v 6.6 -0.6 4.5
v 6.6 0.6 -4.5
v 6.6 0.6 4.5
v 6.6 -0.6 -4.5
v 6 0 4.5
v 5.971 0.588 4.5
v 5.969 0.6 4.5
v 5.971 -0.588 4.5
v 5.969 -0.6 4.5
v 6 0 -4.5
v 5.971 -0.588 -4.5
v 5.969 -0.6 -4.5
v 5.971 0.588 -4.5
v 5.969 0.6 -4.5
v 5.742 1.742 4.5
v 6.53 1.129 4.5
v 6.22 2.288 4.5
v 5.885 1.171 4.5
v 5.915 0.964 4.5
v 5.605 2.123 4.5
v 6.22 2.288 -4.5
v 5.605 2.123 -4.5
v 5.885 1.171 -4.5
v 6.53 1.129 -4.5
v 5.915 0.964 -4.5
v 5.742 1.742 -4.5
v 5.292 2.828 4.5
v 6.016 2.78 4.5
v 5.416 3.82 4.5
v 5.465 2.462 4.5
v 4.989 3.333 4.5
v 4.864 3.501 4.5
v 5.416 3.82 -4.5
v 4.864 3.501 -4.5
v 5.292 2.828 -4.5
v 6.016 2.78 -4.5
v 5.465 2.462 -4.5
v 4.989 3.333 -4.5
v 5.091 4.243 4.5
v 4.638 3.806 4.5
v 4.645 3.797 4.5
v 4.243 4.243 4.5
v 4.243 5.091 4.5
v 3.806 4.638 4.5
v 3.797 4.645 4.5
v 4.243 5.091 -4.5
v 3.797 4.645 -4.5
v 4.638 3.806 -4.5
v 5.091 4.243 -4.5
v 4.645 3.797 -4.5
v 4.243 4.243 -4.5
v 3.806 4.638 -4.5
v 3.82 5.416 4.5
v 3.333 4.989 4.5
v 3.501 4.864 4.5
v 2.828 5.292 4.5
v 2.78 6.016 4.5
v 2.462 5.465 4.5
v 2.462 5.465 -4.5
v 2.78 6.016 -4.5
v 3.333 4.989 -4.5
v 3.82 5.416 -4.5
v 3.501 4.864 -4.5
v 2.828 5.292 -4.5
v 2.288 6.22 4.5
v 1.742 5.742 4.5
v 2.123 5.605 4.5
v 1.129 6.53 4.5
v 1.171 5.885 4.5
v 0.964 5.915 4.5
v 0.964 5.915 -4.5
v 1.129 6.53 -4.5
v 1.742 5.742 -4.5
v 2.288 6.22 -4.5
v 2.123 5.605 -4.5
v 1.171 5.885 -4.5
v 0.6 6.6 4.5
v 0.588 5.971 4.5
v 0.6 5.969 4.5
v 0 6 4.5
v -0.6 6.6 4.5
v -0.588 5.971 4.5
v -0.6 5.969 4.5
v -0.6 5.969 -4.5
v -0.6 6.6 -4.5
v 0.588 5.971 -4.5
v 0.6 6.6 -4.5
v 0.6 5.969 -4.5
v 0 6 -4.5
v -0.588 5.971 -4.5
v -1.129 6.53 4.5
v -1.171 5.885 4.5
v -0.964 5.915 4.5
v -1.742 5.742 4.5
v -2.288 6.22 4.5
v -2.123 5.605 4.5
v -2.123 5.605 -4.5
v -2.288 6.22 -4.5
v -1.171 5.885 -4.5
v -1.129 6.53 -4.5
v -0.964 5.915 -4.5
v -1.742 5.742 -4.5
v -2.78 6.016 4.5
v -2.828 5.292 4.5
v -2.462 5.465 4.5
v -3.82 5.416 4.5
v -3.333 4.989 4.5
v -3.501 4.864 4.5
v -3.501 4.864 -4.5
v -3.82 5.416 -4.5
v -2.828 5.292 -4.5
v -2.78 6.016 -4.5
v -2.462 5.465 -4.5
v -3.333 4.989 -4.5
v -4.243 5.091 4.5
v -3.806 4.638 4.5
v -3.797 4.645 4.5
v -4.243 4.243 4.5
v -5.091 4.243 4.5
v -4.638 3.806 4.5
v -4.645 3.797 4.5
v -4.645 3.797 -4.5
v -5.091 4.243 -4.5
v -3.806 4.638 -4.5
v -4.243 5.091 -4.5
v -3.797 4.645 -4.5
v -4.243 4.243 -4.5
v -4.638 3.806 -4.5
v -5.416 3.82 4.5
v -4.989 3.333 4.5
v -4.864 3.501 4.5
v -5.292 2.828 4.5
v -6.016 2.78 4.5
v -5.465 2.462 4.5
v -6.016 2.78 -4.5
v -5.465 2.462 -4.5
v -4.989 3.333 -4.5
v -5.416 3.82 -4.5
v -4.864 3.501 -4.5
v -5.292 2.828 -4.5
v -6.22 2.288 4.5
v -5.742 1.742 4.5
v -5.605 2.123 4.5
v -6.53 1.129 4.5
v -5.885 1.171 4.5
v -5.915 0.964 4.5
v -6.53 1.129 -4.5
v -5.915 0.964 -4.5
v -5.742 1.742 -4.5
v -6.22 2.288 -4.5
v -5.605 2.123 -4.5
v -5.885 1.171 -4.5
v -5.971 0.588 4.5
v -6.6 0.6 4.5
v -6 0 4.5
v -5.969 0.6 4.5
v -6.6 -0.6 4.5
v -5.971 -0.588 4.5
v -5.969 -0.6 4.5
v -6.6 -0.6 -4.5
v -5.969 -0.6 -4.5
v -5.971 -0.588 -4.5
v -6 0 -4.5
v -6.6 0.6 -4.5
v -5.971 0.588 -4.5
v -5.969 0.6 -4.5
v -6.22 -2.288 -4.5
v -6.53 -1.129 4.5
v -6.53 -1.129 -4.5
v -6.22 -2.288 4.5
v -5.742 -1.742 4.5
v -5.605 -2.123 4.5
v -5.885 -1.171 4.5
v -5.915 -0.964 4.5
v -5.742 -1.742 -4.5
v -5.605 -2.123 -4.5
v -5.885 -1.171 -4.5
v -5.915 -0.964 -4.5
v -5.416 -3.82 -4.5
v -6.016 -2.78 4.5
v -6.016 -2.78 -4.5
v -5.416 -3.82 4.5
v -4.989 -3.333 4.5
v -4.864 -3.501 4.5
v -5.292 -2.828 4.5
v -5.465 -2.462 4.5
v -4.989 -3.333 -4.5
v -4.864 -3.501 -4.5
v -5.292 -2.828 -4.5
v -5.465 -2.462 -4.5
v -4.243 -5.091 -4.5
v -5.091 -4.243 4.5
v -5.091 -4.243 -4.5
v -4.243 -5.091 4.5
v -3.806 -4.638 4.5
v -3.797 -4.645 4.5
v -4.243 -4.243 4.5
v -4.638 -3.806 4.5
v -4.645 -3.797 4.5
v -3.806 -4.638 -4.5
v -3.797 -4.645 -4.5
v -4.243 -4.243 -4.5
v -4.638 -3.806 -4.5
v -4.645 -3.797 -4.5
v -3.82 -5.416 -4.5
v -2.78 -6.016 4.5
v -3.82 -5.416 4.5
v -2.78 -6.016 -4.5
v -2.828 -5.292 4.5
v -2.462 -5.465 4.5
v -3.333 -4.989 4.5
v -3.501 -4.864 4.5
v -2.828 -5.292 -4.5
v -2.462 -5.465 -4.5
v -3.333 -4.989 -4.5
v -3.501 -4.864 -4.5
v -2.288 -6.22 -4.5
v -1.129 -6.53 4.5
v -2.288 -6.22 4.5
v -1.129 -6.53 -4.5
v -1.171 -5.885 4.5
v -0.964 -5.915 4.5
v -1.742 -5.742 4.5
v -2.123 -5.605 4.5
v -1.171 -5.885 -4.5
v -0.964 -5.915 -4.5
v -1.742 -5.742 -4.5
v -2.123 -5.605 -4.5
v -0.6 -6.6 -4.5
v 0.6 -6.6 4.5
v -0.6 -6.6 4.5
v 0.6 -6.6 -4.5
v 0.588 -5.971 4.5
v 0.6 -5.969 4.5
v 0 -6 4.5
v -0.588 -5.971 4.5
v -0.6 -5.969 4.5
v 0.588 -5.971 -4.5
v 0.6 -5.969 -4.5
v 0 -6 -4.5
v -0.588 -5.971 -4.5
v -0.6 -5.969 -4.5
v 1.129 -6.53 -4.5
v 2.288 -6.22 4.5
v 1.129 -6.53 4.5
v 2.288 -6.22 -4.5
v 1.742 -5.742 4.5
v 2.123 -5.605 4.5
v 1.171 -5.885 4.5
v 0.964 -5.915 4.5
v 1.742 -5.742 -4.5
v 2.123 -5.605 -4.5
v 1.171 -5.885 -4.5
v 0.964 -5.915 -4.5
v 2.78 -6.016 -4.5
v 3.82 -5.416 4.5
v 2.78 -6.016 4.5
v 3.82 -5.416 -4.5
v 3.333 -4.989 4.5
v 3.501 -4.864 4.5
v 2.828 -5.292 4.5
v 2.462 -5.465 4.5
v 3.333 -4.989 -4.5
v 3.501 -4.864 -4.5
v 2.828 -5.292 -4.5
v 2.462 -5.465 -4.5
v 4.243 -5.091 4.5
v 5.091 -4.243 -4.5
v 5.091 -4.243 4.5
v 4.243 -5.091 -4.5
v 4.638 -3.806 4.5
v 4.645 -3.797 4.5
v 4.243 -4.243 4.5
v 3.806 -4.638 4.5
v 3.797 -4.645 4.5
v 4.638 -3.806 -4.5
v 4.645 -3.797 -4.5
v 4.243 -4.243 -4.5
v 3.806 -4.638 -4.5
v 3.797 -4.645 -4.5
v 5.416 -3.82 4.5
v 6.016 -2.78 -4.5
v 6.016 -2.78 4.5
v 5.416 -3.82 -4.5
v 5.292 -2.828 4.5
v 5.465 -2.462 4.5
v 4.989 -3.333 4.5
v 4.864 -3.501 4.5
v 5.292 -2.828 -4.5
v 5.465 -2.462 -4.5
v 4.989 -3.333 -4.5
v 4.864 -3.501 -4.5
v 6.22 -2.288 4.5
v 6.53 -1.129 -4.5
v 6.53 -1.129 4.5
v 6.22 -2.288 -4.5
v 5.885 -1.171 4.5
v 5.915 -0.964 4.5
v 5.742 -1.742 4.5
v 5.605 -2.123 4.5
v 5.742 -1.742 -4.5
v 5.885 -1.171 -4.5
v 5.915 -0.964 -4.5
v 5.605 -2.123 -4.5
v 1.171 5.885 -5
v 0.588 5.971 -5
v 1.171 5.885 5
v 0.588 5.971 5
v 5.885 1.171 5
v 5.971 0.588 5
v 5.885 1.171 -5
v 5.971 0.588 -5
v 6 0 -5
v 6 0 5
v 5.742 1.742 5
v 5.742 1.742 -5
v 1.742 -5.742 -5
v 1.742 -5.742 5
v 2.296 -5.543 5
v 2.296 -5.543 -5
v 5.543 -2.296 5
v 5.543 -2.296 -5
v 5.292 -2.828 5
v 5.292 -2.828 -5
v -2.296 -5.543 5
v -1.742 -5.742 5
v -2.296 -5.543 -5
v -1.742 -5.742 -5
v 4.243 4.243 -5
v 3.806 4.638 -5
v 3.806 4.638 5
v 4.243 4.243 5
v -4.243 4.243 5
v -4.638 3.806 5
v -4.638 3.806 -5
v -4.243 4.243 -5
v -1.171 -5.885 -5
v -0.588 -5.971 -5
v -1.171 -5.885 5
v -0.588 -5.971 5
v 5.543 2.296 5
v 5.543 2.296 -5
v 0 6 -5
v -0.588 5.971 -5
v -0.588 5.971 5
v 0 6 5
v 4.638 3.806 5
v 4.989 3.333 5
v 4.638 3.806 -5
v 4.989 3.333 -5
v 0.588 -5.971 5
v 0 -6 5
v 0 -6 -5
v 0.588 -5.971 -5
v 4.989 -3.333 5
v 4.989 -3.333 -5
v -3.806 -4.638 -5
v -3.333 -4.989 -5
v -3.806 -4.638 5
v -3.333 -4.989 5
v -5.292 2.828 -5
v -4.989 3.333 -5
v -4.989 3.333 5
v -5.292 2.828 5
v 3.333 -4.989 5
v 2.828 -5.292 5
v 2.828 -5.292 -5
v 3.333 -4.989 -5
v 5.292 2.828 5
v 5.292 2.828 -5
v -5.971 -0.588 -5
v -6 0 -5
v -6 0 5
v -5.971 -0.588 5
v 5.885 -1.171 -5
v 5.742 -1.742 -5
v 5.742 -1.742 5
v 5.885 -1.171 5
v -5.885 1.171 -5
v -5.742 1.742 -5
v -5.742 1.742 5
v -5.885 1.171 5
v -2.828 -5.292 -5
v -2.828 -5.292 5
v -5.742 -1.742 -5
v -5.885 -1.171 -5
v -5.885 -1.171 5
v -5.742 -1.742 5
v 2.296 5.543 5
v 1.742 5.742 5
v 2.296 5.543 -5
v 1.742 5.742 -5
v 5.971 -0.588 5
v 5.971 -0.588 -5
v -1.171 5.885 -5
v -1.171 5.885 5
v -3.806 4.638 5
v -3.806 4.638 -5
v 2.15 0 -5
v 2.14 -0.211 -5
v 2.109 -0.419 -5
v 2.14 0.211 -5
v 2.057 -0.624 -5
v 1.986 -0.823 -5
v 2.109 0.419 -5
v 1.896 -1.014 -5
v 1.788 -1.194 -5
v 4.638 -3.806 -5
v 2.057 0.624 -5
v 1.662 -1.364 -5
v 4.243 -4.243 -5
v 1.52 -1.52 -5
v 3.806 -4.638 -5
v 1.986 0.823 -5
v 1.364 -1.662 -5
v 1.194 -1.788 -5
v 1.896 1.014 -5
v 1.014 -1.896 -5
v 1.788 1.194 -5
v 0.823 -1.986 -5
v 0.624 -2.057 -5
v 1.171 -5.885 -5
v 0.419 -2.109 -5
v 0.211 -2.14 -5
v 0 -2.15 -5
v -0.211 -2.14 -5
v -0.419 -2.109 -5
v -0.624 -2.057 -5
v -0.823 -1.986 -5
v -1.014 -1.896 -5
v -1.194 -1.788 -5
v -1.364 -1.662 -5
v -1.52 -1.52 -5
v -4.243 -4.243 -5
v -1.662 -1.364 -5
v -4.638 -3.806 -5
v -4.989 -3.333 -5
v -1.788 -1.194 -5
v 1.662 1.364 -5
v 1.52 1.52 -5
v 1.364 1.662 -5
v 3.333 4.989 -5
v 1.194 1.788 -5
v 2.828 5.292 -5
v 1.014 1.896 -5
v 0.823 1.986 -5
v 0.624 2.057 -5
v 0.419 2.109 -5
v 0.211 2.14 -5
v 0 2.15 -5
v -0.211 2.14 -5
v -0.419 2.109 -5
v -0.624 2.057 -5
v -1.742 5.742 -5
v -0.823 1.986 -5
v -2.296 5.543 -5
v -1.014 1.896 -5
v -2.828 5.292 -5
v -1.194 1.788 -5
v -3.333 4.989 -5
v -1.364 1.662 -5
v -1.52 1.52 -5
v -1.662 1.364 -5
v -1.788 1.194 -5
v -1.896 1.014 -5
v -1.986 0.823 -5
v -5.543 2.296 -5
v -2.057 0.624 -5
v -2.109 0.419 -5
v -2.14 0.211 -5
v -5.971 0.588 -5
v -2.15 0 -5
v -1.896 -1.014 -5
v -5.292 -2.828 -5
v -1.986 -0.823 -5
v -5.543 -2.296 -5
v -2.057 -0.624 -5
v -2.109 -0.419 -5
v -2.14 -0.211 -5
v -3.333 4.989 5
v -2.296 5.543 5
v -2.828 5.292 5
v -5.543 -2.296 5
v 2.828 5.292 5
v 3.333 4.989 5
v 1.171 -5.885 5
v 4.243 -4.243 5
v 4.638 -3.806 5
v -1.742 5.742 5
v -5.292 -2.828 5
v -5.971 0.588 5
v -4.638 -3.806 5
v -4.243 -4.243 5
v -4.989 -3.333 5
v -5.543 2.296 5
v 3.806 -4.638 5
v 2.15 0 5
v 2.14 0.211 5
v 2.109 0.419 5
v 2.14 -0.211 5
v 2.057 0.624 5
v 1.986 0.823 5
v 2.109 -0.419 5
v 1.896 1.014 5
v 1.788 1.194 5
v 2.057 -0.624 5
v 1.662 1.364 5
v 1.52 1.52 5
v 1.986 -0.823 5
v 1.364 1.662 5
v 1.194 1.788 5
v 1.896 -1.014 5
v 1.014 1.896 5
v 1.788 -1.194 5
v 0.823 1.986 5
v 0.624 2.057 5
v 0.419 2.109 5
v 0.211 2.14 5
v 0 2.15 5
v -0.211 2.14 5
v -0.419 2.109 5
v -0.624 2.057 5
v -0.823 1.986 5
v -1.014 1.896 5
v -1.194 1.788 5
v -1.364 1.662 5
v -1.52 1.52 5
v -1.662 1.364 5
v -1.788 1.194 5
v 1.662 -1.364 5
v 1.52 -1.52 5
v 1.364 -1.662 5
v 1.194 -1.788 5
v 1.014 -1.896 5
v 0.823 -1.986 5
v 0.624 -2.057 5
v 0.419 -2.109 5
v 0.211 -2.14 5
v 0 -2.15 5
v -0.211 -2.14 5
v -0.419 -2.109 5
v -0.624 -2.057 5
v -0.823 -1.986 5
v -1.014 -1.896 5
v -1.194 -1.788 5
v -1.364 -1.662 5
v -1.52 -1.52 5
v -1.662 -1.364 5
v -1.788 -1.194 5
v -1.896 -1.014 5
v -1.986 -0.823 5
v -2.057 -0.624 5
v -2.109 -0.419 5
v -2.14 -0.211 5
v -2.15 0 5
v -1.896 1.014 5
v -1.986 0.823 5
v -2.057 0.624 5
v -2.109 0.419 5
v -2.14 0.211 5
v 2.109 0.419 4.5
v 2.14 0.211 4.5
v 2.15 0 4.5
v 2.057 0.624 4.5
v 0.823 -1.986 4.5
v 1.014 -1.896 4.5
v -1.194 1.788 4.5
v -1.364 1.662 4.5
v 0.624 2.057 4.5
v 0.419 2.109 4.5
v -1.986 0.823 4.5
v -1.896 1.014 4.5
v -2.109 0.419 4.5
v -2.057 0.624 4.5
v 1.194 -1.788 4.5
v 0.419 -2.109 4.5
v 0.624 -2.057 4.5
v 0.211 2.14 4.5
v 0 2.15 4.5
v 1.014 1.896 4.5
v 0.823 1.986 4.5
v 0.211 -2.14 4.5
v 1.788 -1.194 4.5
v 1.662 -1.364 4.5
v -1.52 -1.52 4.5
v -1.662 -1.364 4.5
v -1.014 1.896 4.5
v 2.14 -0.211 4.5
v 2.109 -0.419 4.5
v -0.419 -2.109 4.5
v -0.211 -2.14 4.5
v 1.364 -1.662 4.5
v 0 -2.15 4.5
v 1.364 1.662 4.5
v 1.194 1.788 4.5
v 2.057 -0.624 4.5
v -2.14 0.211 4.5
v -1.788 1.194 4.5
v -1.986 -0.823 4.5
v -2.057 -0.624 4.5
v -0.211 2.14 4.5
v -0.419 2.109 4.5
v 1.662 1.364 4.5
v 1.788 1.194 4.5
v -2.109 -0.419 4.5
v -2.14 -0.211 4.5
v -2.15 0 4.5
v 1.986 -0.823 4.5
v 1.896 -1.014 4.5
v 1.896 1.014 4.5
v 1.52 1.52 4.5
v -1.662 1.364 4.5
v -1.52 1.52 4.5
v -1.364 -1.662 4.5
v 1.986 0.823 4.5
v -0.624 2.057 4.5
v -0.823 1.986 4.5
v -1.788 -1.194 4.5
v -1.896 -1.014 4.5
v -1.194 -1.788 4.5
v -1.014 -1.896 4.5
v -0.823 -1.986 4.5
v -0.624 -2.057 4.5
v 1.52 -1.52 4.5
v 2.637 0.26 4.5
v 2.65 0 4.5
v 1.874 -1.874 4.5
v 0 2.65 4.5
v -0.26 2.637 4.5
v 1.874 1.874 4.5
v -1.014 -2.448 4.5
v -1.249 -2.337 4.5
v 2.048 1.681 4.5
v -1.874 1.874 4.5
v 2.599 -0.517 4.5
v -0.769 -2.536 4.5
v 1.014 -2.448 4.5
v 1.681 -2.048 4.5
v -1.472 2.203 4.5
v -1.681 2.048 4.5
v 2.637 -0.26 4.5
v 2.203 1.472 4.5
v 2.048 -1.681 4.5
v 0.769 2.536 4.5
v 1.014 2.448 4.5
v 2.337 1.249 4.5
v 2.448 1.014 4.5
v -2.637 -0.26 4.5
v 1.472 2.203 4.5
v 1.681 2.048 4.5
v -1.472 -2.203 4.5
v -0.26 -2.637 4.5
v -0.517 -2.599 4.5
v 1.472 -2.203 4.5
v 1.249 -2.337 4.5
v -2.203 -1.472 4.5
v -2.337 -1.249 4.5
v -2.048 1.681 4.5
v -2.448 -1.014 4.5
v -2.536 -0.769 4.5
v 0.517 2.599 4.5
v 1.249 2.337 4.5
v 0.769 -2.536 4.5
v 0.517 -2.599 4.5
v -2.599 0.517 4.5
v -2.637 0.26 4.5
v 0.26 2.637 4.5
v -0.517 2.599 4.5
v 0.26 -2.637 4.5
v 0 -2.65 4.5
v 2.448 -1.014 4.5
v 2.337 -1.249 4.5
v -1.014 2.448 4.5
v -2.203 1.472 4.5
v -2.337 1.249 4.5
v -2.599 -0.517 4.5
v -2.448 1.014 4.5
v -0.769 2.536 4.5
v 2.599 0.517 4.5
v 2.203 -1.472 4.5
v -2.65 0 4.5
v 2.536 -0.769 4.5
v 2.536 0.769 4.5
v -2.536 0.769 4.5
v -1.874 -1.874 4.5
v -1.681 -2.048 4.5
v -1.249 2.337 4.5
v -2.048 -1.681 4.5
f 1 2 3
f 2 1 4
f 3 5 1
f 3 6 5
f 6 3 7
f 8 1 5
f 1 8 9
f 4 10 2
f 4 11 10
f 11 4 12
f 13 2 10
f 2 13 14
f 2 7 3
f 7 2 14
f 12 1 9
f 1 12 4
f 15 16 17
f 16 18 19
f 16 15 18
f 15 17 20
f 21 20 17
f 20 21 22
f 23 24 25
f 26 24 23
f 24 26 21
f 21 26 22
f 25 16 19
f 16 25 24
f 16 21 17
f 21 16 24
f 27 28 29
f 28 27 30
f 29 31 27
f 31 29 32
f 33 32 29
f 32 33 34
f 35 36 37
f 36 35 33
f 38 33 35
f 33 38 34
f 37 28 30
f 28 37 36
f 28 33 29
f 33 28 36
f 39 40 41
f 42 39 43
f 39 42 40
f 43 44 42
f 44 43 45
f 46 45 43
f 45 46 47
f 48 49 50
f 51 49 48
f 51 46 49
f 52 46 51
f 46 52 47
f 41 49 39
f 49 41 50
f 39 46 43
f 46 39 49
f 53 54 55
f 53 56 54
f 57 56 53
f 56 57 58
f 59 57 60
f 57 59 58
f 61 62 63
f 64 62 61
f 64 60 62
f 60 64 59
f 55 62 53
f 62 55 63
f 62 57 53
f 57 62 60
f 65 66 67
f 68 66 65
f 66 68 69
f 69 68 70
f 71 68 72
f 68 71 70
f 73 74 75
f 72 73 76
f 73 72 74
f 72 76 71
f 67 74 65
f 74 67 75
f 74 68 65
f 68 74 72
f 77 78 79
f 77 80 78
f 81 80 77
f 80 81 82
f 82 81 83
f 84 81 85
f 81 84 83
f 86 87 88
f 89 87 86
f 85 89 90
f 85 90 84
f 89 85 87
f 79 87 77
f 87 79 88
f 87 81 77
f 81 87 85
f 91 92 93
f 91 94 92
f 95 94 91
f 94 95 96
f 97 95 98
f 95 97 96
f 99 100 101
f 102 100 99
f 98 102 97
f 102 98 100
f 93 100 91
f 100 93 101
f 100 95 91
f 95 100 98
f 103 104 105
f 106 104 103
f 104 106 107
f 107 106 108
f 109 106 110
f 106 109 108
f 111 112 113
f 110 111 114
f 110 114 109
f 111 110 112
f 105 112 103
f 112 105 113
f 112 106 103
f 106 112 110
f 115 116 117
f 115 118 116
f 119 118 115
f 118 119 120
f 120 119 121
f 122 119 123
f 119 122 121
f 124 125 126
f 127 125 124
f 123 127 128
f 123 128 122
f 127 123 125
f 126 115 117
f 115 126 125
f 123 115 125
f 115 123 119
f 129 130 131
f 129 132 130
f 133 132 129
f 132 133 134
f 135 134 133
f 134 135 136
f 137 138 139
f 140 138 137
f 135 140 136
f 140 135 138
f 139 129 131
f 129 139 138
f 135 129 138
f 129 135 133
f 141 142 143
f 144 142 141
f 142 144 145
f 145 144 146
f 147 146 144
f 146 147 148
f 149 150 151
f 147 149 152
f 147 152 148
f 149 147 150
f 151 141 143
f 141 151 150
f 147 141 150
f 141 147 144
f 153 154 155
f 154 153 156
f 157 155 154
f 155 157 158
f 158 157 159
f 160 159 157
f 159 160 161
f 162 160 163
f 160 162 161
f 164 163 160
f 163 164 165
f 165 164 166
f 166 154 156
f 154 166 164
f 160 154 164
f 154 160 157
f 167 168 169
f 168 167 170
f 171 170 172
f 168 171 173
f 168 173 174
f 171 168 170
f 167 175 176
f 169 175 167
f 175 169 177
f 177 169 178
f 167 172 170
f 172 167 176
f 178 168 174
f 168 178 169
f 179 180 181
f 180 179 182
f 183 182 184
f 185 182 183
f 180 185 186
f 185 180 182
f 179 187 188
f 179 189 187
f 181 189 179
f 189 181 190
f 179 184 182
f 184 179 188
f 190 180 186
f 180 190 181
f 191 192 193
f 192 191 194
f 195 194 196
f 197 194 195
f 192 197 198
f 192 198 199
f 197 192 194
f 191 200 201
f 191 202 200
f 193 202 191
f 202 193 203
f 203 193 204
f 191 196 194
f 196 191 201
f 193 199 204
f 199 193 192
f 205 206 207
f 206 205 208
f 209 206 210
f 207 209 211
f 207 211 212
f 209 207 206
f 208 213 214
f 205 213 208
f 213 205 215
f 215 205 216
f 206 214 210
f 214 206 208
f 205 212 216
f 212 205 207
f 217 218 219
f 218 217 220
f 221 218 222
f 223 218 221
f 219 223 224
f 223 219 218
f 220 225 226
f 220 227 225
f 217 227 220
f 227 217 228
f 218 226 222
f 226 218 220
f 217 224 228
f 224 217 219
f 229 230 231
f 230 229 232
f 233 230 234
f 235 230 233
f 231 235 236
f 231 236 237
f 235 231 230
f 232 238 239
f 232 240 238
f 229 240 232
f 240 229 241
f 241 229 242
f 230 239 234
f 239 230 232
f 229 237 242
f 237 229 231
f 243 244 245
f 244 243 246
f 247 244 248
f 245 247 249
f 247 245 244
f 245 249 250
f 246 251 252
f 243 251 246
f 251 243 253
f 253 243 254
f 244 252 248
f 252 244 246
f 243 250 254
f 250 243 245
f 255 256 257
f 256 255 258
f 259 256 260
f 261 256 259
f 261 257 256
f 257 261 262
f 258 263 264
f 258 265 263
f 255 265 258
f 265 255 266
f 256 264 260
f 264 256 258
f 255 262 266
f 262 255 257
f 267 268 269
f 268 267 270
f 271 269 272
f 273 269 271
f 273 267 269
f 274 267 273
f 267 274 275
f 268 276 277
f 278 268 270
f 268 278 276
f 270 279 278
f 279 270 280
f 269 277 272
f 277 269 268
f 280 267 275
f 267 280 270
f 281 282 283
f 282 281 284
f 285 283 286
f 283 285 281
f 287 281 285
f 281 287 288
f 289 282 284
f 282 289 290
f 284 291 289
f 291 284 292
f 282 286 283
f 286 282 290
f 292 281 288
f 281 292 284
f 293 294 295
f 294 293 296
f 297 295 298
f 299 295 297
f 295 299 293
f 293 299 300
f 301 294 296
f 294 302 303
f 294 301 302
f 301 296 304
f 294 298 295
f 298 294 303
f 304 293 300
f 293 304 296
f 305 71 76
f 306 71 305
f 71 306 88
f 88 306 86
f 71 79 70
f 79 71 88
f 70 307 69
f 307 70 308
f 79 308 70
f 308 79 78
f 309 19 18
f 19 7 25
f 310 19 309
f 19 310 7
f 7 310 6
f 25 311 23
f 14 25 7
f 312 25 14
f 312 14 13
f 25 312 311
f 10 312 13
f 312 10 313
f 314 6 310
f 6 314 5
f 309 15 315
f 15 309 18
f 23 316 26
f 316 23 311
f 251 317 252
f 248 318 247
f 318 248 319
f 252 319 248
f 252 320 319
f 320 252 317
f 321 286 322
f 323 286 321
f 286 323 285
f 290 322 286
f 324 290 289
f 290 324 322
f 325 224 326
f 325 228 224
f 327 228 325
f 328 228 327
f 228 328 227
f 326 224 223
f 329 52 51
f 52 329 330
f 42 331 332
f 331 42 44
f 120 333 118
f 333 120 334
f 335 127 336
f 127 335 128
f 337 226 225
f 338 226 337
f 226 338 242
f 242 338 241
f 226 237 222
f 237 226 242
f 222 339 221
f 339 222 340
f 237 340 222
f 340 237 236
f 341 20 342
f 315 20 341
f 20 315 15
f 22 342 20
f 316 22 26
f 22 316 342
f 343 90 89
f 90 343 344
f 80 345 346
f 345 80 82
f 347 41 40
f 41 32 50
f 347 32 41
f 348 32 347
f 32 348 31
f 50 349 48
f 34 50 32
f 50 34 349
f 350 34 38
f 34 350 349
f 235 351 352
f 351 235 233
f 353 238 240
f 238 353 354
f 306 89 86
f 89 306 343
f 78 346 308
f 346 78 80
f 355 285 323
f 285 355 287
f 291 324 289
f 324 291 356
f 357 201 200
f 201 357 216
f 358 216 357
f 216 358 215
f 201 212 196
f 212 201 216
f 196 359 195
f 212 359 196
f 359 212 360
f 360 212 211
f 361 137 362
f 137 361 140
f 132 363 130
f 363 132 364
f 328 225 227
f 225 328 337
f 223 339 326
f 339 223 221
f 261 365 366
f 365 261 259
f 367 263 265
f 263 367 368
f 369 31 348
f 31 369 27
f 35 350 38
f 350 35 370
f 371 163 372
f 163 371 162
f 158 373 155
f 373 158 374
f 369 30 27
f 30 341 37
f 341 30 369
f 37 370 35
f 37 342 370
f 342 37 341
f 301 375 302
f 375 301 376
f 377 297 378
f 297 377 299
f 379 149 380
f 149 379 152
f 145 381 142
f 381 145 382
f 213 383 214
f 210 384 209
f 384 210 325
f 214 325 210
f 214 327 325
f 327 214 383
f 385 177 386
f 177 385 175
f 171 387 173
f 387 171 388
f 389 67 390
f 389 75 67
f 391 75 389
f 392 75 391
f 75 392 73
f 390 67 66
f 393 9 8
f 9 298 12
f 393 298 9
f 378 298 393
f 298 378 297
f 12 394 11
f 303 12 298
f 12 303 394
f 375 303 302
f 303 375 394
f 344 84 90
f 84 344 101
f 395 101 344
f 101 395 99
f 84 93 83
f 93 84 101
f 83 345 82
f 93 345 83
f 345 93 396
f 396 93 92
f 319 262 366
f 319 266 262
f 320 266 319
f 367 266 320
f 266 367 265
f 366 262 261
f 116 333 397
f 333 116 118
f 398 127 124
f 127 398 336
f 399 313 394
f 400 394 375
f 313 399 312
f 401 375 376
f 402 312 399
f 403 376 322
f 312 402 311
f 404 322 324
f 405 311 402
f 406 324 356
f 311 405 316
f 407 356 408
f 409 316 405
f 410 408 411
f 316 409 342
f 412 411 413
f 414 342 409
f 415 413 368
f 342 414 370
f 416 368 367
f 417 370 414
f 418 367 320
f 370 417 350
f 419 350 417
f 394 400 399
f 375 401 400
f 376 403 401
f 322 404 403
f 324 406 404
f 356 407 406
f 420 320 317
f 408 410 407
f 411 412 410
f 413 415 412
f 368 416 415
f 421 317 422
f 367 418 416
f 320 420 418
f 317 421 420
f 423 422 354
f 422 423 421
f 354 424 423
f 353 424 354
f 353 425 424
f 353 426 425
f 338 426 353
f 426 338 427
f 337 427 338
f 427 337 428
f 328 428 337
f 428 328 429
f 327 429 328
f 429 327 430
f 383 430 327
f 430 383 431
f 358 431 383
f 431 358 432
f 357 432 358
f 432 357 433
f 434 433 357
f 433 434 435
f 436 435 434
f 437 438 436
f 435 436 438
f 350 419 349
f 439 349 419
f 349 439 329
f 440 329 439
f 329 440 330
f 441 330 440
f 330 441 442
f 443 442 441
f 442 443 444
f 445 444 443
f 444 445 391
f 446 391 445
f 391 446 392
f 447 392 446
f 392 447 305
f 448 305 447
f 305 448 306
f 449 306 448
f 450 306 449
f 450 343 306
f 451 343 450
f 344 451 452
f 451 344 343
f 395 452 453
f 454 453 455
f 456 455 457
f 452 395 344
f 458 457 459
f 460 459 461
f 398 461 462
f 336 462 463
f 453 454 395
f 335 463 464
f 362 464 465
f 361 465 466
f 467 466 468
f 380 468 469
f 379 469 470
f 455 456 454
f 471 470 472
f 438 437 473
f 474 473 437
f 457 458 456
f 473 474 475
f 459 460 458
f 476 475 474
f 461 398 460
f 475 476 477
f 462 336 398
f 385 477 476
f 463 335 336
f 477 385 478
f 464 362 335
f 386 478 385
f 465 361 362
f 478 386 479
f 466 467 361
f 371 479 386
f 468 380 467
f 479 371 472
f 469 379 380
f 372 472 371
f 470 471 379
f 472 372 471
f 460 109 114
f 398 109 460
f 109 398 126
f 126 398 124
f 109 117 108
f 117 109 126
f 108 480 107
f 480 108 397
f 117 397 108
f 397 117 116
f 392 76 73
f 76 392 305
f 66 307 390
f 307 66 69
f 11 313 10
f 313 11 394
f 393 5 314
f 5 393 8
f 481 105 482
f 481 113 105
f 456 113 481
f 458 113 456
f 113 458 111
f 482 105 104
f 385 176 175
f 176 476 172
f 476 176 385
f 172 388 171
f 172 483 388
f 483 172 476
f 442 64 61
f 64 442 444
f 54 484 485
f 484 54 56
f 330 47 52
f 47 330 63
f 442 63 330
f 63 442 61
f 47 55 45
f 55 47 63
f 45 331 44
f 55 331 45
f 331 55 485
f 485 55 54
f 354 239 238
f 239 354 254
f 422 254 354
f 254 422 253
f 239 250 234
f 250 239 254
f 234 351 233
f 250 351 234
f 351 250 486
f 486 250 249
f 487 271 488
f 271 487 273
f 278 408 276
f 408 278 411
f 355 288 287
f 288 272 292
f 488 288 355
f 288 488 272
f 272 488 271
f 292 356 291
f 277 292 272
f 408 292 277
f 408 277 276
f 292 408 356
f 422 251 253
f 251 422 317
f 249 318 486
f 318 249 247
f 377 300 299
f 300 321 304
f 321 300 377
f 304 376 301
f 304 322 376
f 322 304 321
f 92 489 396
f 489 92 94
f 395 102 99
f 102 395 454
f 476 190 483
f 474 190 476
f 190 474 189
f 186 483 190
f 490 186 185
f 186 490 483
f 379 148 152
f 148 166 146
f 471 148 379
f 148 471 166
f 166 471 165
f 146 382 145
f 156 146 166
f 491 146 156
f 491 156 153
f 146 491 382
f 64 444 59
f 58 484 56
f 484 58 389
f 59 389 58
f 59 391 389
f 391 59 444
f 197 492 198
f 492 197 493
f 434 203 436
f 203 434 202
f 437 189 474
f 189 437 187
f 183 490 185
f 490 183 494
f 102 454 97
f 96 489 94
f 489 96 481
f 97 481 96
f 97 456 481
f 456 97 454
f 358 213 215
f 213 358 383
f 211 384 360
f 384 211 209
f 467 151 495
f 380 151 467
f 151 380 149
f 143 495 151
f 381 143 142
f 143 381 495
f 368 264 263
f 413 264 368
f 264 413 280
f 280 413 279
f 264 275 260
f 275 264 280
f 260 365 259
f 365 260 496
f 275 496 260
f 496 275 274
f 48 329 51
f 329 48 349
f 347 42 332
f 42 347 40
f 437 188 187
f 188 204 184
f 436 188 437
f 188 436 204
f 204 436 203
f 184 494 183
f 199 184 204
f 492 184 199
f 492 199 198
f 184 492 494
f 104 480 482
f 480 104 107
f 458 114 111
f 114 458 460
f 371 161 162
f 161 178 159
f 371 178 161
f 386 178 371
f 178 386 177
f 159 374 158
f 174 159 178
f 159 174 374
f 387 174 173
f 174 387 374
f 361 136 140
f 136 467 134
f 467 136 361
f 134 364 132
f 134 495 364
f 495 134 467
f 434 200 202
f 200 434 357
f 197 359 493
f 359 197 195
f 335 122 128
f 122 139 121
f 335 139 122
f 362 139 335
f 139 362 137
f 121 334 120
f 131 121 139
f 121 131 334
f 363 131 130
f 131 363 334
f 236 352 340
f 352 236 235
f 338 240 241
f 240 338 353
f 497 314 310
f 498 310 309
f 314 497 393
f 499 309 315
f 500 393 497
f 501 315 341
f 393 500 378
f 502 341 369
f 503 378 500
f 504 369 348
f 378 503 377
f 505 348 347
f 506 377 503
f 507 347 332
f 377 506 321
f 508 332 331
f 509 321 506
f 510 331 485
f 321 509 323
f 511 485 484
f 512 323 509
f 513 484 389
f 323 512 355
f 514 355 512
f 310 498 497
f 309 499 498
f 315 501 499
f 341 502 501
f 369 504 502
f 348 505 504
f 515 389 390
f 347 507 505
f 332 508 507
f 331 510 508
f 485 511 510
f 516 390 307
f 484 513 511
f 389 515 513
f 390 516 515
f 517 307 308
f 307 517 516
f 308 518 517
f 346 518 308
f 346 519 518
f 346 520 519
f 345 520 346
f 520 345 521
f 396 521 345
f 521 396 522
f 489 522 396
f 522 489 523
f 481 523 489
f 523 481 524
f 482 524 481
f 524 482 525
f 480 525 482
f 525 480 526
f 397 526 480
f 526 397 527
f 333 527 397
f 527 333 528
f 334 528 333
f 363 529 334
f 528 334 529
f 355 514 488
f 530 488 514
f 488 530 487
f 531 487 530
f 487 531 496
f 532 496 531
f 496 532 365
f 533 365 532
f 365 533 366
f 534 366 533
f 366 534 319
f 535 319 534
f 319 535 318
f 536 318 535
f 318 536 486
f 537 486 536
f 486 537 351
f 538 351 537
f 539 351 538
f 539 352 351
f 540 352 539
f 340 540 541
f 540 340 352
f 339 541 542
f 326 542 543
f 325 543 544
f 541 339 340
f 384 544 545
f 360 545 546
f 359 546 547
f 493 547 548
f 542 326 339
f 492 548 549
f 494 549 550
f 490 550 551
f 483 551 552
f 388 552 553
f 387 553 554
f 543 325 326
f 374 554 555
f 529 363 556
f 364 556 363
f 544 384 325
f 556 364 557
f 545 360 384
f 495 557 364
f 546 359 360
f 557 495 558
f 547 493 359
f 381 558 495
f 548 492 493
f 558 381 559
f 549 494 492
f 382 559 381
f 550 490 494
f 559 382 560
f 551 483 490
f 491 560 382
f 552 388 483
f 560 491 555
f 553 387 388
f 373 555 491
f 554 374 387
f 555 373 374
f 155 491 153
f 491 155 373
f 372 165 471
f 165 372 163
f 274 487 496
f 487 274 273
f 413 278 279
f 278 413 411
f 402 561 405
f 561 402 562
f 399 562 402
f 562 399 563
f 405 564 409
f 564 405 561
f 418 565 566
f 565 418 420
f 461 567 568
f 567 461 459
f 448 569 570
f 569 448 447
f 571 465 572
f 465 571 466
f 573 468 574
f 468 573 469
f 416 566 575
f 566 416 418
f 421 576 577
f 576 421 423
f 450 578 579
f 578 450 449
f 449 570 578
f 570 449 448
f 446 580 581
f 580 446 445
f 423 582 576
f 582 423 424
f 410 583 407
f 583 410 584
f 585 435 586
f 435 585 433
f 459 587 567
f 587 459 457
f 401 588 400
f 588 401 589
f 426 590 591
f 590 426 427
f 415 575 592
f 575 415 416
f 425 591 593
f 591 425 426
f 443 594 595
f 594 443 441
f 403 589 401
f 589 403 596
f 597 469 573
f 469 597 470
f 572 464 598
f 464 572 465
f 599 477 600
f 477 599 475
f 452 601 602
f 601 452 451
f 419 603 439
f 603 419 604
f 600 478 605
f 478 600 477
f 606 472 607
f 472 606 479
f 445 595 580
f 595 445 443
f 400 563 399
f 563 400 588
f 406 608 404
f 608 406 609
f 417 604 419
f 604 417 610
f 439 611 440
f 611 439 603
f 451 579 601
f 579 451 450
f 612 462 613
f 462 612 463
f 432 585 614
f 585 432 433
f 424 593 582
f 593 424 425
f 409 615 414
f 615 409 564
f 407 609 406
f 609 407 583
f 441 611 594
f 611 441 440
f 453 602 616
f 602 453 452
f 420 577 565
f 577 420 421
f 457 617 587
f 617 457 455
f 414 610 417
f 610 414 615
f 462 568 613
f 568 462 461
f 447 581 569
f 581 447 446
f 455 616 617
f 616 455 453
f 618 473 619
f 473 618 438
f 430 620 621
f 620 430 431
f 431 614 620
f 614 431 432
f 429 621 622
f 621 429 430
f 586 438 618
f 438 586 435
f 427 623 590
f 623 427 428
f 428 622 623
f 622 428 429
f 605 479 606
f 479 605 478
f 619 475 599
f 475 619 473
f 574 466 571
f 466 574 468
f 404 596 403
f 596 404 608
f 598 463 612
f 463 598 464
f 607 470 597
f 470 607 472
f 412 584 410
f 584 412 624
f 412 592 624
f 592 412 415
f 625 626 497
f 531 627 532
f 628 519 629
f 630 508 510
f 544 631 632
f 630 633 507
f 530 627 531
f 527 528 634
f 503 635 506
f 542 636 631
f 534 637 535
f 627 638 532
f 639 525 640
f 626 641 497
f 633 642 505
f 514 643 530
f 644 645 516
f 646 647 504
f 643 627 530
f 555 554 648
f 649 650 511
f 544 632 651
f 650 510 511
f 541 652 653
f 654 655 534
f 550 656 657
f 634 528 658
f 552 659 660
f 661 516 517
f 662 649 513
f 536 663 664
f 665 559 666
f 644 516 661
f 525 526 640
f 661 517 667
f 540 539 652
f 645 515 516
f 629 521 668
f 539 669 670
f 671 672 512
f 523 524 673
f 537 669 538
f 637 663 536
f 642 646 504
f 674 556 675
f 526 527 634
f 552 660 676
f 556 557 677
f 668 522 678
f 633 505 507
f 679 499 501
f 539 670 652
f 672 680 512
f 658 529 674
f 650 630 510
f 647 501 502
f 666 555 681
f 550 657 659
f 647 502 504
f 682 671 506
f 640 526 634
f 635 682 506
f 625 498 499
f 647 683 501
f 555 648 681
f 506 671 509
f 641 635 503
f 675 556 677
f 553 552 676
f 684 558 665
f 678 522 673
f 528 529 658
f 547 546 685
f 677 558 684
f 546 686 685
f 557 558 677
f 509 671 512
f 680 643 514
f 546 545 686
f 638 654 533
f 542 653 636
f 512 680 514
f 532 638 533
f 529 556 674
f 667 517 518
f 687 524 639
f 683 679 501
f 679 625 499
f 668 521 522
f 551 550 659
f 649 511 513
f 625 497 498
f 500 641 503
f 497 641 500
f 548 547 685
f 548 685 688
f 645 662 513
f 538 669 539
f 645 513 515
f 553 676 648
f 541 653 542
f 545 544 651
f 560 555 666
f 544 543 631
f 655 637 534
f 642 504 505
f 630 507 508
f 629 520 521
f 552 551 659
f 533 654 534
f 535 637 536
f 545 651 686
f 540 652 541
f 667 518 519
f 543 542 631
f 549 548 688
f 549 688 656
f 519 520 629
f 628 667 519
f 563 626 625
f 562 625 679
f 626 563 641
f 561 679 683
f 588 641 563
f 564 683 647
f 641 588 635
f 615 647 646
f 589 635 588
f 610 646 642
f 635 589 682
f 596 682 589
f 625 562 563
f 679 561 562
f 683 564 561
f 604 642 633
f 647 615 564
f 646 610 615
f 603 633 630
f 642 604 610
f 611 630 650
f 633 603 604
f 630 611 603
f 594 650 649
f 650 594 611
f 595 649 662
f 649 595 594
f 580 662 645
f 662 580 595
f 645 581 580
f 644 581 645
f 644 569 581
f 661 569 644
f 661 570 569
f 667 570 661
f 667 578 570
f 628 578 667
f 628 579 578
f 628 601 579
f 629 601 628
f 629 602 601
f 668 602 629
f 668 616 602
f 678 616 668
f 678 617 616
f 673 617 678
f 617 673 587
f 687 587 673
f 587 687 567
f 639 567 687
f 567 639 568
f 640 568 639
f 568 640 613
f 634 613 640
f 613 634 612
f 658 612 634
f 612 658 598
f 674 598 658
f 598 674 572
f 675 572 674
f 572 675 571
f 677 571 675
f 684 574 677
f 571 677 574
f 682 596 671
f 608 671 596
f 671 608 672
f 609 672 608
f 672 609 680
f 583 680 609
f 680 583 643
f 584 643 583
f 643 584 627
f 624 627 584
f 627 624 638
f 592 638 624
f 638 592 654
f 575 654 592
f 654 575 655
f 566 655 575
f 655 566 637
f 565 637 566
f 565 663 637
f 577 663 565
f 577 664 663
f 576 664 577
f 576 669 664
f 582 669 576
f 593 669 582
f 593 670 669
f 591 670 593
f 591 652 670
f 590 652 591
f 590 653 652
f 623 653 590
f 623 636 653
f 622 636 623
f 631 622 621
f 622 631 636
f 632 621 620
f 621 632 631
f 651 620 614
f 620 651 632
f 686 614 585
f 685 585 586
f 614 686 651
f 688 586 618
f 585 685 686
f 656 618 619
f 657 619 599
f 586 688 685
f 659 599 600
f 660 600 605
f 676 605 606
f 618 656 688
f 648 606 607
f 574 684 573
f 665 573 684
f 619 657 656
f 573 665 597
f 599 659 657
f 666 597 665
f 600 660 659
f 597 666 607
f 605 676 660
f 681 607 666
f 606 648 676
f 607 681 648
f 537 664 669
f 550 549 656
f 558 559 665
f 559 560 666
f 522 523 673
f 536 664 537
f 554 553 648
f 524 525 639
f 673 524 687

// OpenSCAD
// Parameters
outer_diameter_mm = 12; //[6:24:0.1]
length_mm = 10; //[5:20:0.1]
screw_diameter_mm = 5; //[2.5:10:0.1]
thread_pitch_mm = 0.8; //[0.4:1.6:0.05]
tolerance_mm = 0.1; //[0.05:0.3:0.01]
inner_thread_minor_diameter_mm = 4.2; //[3.5:5:0.05]
lead_in_chamfer_mm = 0.5; //[0.2:2:0.1]
outer_feature_style = 1; //[0:2:1]
knurl_count = 24; //[12:48:1]
knurl_rib_depth_mm = 0.6; //[0.3:1.2:0.05]
knurl_rib_width_mm = 1.2; //[0.6:2.4:0.05]
knurl_rib_length_mm = 9; //[4.5:18:0.1]
rib_overlap_mm = 0.8; //[0.5:2:0.1]
bore_extra_height_mm = 2; //[1:6:0.5]

// Heat-set insert body
module heat_set_insert_body() {
  color("Gold") {
    cylinder(r=outer_diameter_mm/2, h=length_mm, center=true, $fn=64);
  }
}

// Internal thread bore
module internal_thread_bore_M5() {
  cylinder(r=(inner_thread_minor_diameter_mm + tolerance_mm)/2, h=length_mm + bore_extra_height_mm, center=true, $fn=64);
}

// Lead-in chamfer
module lead_in_chamfer() {
  translate([0, 0, length_mm/2 - lead_in_chamfer_mm/2])
    cylinder(r1=(inner_thread_minor_diameter_mm + tolerance_mm)/2 + lead_in_chamfer_mm, r2=(inner_thread_minor_diameter_mm + tolerance_mm)/2, h=lead_in_chamfer_mm, center=true, $fn=64);
}

// Knurl rib prototype
module outer_knurl_rib_proto() {
  translate([outer_diameter_mm/2 + (knurl_rib_depth_mm + rib_overlap_mm)/2 - rib_overlap_mm, 0, 0])
    cube([knurl_rib_depth_mm + rib_overlap_mm, knurl_rib_width_mm, knurl_rib_length_mm], center=true);
}

// Knurl ribs
module outer_knurl_or_ribs() {
  for (i = [0:knurl_count-1]) {
    rotate([0, 0, i*360/knurl_count])
      outer_knurl_rib_proto();
  }
}

// Complete insert with knurls
module insert() {
  union() {
    heat_set_insert_body();
    outer_knurl_or_ribs();
  }
}

// Threaded insert with bore and chamfer
module threaded_insert() {
  difference() {
    insert();
    internal_thread_bore_M5();
    lead_in_chamfer();
  }
}

// Assembly
module assembly() {
  threaded_insert();
}

assembly();
